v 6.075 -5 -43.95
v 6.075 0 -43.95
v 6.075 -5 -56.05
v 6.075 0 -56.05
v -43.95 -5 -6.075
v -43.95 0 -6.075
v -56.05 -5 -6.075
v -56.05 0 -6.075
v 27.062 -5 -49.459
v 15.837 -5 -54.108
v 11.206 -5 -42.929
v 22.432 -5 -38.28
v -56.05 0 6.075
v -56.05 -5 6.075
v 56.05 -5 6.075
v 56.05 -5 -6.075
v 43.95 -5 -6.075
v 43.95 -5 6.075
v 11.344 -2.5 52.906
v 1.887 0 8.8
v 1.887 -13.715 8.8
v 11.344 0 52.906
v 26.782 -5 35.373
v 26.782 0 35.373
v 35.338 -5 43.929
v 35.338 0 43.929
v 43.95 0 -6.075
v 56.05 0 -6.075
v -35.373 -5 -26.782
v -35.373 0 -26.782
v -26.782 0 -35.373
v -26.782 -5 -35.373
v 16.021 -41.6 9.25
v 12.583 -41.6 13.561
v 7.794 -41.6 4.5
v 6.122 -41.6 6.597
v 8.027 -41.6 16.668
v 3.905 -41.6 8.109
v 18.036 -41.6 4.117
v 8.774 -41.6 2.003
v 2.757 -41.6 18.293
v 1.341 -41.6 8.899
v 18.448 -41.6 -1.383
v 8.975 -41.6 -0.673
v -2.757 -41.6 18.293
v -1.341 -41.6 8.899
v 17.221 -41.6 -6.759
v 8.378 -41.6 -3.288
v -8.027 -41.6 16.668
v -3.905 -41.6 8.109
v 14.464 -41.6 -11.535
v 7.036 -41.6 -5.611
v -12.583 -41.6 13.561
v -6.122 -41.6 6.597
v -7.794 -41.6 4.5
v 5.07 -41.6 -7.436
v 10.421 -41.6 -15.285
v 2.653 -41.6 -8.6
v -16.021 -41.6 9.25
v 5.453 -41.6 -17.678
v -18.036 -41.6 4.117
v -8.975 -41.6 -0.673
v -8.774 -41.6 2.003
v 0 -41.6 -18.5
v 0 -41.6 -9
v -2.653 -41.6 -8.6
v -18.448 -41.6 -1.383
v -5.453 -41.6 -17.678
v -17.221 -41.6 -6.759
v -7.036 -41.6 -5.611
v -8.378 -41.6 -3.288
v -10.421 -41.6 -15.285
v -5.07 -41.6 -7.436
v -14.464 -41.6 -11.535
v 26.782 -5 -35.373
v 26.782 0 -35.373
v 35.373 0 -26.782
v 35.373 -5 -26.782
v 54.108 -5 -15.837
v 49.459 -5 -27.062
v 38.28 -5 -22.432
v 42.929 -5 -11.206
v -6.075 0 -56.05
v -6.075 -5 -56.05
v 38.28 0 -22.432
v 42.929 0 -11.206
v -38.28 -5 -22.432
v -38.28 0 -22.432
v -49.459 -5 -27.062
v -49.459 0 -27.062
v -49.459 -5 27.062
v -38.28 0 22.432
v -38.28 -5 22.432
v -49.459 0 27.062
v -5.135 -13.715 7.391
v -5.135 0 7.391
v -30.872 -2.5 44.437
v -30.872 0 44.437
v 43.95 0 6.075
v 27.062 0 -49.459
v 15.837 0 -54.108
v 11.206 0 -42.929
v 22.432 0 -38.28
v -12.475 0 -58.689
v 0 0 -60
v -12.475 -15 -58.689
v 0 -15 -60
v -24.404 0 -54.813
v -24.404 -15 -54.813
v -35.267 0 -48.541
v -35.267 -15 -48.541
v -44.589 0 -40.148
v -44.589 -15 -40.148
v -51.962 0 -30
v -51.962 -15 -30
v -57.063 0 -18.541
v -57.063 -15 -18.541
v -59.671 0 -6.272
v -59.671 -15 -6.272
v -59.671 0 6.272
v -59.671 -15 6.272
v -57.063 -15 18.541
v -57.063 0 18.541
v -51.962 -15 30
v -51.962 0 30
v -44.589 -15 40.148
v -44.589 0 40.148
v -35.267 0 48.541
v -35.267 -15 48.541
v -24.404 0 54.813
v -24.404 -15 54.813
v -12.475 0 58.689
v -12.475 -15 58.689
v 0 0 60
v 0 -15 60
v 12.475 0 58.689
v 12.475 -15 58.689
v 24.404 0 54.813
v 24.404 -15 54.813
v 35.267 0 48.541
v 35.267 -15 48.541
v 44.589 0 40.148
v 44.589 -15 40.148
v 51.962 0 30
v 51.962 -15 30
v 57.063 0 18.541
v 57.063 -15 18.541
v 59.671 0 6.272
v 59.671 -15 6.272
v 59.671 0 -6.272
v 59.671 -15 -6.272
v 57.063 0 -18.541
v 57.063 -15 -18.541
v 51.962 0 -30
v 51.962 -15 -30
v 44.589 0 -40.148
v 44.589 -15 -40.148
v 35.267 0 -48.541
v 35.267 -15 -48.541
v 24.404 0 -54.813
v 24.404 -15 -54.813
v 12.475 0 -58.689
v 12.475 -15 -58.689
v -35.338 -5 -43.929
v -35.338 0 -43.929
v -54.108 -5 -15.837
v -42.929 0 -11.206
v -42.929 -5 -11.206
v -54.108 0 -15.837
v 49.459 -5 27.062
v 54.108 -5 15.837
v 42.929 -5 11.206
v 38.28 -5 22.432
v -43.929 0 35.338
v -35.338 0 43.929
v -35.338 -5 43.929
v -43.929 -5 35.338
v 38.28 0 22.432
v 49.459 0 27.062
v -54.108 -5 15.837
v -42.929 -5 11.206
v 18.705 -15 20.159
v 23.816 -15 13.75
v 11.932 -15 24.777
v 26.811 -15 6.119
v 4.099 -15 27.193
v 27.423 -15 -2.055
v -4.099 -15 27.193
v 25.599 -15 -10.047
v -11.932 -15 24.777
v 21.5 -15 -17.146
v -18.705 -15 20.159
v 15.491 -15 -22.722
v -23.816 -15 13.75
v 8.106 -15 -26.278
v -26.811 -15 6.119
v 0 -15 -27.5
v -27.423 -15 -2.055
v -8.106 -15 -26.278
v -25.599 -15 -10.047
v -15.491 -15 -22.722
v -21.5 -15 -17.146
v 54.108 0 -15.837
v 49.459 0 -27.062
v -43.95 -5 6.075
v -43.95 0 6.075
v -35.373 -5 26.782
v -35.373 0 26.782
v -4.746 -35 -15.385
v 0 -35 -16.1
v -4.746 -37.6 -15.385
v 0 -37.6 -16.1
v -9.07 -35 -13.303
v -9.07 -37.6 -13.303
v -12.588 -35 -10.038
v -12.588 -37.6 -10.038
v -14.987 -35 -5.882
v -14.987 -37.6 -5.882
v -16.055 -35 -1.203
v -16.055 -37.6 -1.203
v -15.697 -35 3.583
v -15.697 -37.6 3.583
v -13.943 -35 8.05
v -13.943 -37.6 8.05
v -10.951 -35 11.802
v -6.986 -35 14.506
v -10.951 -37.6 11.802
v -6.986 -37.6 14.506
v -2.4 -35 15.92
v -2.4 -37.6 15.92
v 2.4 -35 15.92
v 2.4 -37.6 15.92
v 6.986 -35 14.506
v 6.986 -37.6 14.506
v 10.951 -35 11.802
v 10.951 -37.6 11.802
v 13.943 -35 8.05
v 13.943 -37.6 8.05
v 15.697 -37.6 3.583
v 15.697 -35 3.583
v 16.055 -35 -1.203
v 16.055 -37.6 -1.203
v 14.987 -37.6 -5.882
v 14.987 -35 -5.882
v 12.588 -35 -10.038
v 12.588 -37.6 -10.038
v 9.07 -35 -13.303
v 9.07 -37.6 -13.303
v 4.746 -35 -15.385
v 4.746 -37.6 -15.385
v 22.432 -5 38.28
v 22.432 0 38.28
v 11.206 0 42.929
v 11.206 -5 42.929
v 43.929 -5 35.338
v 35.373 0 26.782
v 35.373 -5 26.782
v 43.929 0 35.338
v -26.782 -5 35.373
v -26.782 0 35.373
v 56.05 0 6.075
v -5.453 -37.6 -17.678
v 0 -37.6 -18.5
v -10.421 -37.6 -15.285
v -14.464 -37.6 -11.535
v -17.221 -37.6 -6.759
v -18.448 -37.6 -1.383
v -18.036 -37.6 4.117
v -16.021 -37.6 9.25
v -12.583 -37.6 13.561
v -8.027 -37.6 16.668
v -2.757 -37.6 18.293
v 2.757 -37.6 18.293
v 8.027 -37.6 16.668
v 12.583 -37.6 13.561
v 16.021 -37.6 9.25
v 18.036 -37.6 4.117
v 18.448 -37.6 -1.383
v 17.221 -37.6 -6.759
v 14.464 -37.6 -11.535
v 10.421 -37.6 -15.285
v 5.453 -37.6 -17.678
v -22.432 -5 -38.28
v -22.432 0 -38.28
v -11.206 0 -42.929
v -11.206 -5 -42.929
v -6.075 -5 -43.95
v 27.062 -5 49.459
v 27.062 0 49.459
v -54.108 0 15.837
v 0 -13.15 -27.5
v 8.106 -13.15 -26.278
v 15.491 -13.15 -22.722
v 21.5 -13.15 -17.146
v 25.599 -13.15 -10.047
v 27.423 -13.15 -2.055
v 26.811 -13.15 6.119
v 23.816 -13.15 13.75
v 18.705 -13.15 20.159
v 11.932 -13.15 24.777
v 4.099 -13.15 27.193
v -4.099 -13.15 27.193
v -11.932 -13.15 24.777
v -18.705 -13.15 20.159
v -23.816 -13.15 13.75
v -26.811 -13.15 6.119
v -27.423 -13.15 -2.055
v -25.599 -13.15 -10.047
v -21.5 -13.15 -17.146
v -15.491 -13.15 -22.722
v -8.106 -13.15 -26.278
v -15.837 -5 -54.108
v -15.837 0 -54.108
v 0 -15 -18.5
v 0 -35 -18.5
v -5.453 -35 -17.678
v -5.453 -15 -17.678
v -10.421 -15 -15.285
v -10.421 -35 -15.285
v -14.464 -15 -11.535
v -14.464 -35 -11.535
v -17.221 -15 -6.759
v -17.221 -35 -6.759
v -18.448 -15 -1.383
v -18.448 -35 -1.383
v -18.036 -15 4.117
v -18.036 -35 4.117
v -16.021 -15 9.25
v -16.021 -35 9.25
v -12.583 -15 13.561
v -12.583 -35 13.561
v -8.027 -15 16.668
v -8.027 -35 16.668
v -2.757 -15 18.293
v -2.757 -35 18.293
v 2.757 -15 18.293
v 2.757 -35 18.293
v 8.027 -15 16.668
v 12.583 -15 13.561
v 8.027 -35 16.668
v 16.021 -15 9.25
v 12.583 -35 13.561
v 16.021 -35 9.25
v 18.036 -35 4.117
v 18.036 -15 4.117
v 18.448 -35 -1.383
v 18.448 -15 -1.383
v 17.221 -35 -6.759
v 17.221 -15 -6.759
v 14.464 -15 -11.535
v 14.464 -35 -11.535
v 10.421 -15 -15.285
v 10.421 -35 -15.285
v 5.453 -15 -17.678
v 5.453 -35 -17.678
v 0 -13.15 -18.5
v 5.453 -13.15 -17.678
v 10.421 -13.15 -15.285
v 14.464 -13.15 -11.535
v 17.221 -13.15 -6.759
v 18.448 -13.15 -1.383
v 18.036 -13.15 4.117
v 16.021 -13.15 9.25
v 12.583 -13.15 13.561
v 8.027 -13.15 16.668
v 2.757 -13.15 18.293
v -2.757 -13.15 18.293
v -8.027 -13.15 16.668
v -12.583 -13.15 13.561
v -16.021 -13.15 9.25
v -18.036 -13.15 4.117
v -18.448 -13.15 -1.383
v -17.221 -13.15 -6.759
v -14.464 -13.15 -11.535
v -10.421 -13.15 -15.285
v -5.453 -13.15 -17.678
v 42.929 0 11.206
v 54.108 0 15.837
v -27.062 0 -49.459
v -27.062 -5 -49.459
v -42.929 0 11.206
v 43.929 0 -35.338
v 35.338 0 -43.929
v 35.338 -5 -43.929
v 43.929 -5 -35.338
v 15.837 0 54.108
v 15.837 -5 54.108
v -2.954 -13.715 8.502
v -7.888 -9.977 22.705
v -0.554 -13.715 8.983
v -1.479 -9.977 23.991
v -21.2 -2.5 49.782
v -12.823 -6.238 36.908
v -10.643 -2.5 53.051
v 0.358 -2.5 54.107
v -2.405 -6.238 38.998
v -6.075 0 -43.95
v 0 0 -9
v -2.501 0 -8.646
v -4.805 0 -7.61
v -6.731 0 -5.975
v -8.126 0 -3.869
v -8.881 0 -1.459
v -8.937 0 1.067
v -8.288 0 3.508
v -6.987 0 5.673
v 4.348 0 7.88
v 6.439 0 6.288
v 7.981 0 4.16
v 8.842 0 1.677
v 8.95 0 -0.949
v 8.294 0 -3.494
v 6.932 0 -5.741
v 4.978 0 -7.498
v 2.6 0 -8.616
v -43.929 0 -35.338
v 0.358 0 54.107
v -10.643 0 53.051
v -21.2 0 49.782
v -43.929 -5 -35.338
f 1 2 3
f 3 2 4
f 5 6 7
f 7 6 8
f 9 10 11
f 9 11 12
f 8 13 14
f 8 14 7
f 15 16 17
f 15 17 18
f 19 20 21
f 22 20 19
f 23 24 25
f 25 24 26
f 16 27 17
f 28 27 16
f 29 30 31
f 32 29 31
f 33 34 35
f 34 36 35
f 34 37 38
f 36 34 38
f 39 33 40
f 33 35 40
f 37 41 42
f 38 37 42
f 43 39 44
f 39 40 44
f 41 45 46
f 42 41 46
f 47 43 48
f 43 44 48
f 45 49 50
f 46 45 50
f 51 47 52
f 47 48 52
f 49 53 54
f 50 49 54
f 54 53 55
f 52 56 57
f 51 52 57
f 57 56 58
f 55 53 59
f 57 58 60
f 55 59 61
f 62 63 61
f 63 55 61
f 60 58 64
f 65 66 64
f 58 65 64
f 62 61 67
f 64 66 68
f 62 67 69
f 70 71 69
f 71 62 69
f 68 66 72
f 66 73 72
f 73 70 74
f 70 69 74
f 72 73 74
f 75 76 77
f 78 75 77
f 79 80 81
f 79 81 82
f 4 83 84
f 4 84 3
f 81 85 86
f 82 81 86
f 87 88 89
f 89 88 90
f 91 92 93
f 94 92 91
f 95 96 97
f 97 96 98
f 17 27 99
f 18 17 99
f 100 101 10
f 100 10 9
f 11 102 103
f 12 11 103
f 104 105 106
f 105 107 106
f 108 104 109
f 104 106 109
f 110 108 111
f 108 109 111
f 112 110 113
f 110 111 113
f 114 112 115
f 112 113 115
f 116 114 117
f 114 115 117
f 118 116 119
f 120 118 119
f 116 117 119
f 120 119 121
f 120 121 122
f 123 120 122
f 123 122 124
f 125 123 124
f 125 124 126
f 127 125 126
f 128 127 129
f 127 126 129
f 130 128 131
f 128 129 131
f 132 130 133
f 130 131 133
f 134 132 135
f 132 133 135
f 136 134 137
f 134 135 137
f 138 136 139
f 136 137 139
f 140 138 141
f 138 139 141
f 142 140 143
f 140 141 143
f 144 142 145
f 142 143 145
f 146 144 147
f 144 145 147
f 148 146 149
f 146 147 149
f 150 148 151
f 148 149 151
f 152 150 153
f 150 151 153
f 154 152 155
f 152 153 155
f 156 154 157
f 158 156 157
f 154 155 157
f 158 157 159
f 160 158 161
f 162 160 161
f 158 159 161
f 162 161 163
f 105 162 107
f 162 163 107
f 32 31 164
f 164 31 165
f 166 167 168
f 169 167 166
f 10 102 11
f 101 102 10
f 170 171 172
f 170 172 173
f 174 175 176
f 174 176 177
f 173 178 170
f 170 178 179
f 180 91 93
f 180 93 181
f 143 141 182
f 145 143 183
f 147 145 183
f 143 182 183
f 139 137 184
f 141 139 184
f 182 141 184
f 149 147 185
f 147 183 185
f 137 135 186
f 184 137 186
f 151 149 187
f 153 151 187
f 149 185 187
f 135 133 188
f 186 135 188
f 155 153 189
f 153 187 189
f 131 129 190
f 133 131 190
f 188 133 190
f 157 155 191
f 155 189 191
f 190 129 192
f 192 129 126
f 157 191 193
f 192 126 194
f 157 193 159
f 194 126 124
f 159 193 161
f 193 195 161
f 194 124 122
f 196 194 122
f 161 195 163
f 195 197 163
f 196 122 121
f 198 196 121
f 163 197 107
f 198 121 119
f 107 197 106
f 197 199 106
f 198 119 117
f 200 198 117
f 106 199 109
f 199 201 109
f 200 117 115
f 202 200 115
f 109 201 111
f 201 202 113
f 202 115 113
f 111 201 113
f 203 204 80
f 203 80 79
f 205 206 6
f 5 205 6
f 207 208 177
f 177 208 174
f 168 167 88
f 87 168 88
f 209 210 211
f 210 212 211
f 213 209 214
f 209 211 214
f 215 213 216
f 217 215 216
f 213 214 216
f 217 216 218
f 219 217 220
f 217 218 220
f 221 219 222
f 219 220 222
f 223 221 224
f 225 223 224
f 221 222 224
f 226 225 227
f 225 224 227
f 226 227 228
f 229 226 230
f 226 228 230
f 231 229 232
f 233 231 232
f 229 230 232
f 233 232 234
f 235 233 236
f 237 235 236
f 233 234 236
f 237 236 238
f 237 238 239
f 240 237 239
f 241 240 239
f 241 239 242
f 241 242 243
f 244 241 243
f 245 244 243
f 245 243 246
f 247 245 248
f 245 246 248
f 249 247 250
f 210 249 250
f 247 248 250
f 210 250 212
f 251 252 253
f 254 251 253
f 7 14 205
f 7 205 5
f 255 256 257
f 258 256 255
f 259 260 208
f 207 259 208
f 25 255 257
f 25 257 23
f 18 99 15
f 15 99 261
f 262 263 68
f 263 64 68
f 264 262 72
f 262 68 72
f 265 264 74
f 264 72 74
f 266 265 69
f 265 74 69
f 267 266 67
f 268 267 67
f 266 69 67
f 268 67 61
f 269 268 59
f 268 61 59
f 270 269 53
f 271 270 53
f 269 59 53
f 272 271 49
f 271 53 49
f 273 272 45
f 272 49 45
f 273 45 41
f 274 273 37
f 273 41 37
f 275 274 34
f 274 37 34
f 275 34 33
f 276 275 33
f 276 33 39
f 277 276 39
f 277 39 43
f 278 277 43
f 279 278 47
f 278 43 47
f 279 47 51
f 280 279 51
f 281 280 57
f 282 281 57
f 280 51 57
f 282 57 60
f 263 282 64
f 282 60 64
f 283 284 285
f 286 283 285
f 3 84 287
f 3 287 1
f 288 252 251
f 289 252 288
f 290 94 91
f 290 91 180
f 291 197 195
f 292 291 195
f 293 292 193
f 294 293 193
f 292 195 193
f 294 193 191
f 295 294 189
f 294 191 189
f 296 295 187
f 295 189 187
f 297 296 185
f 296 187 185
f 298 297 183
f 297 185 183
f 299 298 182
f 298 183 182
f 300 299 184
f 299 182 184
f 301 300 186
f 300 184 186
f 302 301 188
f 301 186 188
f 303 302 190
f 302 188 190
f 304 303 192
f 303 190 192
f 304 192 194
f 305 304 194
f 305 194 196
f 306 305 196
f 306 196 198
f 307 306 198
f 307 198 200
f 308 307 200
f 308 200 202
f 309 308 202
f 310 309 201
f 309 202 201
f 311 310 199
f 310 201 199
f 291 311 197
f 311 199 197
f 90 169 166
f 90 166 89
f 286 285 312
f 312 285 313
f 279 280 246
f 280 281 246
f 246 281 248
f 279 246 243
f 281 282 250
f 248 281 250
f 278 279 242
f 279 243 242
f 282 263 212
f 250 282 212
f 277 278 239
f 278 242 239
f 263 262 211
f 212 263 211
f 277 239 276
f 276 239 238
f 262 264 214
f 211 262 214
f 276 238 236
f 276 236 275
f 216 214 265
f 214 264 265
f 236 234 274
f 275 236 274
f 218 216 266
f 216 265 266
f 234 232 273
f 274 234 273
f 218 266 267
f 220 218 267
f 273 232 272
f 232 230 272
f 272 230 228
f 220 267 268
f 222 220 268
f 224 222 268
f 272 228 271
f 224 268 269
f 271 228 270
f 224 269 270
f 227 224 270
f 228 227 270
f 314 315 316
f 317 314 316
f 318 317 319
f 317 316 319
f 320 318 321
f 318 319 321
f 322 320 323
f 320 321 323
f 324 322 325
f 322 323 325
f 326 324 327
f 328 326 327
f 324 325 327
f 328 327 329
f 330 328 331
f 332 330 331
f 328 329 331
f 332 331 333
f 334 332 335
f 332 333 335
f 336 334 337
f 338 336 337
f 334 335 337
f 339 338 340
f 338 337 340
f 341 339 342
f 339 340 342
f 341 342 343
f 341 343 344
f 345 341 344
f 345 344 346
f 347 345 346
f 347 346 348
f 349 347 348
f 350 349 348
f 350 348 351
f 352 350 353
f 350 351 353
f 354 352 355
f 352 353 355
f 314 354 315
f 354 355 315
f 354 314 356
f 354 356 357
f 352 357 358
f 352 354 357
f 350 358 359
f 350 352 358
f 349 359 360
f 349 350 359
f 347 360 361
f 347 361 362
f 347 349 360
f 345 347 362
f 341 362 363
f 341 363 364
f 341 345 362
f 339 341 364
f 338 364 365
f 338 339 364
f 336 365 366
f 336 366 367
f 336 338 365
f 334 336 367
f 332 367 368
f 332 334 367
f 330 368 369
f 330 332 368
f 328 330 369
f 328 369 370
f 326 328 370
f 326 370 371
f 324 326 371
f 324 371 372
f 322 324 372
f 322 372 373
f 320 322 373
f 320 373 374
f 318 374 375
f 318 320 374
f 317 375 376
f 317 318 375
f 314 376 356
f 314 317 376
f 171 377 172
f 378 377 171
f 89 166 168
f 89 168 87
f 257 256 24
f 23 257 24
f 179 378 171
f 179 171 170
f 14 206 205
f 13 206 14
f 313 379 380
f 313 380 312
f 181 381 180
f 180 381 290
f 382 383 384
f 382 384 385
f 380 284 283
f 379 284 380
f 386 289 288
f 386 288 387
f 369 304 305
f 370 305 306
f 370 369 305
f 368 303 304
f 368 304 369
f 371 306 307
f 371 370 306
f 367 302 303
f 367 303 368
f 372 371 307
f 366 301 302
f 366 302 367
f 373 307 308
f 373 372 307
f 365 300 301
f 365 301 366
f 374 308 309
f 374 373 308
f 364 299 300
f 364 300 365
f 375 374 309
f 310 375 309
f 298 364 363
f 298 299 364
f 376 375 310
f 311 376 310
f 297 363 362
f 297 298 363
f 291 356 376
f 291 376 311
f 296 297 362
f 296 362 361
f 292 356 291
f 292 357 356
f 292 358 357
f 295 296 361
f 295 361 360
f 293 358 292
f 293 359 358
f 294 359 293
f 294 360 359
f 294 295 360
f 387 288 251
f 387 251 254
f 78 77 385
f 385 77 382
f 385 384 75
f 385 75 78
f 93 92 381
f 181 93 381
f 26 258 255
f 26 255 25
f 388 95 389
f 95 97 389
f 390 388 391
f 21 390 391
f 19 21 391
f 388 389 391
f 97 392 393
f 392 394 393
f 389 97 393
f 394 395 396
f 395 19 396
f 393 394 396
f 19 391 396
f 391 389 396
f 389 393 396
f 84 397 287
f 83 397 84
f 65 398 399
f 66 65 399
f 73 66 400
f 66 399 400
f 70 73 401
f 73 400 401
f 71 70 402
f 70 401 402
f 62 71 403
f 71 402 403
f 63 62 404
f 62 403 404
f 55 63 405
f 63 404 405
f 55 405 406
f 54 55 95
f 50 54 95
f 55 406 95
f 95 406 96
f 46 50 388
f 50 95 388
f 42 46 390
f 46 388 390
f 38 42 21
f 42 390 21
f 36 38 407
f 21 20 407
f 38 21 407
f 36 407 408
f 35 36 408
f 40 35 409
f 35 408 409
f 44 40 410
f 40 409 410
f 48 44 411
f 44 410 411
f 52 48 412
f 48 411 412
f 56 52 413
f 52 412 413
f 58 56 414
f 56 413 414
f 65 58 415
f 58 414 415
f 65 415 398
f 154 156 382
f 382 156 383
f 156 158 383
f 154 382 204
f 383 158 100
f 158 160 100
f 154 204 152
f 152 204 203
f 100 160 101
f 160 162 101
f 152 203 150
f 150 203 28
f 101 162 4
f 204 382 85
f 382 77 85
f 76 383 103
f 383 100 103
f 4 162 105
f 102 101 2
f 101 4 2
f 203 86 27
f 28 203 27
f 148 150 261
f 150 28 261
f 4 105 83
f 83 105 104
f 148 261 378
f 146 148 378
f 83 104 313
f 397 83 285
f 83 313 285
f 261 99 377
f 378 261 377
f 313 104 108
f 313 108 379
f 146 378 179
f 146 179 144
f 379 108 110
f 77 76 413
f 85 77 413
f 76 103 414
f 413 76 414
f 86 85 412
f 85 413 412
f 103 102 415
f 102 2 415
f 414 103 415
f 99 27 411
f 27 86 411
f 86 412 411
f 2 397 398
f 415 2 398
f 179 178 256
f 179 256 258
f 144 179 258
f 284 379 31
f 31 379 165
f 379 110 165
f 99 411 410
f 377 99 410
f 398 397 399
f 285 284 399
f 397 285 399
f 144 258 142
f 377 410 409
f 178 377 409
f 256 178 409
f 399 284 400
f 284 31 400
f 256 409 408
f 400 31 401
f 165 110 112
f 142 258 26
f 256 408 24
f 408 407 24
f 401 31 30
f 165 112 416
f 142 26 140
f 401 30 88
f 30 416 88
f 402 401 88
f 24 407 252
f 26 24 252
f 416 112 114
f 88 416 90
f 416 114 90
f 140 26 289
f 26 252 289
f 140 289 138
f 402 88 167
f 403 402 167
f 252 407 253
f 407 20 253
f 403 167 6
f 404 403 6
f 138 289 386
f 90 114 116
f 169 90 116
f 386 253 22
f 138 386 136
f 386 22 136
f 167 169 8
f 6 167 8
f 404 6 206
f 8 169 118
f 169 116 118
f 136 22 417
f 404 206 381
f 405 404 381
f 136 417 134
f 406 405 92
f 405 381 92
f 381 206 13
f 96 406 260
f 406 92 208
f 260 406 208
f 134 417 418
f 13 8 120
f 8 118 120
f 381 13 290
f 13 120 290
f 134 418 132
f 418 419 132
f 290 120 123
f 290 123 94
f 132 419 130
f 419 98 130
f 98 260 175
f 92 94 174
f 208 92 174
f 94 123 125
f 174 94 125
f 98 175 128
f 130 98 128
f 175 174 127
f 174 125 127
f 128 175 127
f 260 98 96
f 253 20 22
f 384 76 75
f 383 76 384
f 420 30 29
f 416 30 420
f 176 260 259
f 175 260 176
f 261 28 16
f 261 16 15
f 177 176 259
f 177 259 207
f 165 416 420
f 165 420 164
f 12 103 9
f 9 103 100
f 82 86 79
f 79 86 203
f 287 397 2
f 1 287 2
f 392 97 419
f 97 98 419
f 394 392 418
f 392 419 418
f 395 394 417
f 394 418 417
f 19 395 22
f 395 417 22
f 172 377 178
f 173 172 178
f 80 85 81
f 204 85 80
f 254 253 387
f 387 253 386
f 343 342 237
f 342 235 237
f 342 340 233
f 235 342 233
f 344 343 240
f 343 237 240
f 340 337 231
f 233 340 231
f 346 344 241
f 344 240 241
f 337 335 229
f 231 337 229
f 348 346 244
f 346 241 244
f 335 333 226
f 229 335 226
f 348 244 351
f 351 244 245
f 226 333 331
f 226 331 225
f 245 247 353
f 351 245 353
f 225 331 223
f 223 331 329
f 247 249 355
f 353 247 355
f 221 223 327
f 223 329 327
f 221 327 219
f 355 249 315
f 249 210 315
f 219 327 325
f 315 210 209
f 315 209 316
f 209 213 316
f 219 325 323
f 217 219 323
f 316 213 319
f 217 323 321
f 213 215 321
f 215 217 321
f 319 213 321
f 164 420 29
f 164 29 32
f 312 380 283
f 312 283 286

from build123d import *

# Parameters (mm, degrees)
SKETCH3_W          = 12.15
SKETCH3_H          = 12.1
CUT_EXTRUDE1_DEPTH = 5
CIRPATTERN1_COUNT  = 16
CUT_SWEEP3_ANGLE   = 46.890766
SKETCH8_R          = 27.5
SKETCH8_R_2        = 18.5
CUT_EXTRUDE2_DEPTH = 1.85


# Read off the part's stored shape, not the designer's step: Cut-Sweep3
with BuildPart() as part:
    # Sketch1 → Revolve1 (revolve)
    with BuildSketch(Plane(origin=(0, 0, 0), x_dir=(0, 0, -1), z_dir=(1, 0, 0))):
        Polygon((9, 0), (60, 0), (60, -15), (18.5, -15), (18.5, -35), (16.100175422, -35), (16.100175422, -37.6), (18.5, -37.6), (18.5, -41.6), (9, -41.6), align=None)
    revolve(axis=Axis((0, 0, 0), (0, 1, 0)))

    # Sketch3 → Cut-Extrude1 (cut)
    with BuildSketch(Plane(origin=(0, 0, 0), x_dir=(1, 0, 0), z_dir=(0, 1, 0))):
        with Locations((0, 50)):
            Rectangle(SKETCH3_W, SKETCH3_H)
    cut_extrude1 = extrude(amount=-CUT_EXTRUDE1_DEPTH, mode=Mode.SUBTRACT)

    # CirPattern1: Cut-Extrude1 ×16 about axis, 2 skipped
    cirpattern1_axis = Axis((0, 0, 0), (0, -1, 0))
    add([cut_extrude1.rotate(cirpattern1_axis, i * 360 / CIRPATTERN1_COUNT) for i in range(1, CIRPATTERN1_COUNT) if i not in (8, 9)], mode=Mode.SUBTRACT)

    # Cut-Sweep3 outline → Cut-Sweep3 (revolve, cut)
    with BuildSketch(Plane(origin=(0, 0, 0), x_dir=(-0.5705578043075098, 0, 0.8212574455941287), z_dir=(-0.8212574455941287, 0, -0.5705578043075098))):
        Polygon((54.108249649, -2.5), (54.108249649, 0), (9, 0), (9, -13.715253714), align=None)
    revolve(axis=Axis((0, 0, 0), (0, 1, 0)), revolution_arc=CUT_SWEEP3_ANGLE, mode=Mode.SUBTRACT)

    # Sketch8 → Cut-Extrude2 (cut)
    with BuildSketch(Plane.XZ.offset(15)):
        with Locations(Location((0, 0, 0), (0, 0, 270))):
            Circle(SKETCH8_R)
        with Locations(Location((0, 0, 0), (0, 0, 270))):
            Circle(SKETCH8_R_2, mode=Mode.SUBTRACT)
    extrude(amount=-CUT_EXTRUDE2_DEPTH, mode=Mode.SUBTRACT)


solid = part.part
